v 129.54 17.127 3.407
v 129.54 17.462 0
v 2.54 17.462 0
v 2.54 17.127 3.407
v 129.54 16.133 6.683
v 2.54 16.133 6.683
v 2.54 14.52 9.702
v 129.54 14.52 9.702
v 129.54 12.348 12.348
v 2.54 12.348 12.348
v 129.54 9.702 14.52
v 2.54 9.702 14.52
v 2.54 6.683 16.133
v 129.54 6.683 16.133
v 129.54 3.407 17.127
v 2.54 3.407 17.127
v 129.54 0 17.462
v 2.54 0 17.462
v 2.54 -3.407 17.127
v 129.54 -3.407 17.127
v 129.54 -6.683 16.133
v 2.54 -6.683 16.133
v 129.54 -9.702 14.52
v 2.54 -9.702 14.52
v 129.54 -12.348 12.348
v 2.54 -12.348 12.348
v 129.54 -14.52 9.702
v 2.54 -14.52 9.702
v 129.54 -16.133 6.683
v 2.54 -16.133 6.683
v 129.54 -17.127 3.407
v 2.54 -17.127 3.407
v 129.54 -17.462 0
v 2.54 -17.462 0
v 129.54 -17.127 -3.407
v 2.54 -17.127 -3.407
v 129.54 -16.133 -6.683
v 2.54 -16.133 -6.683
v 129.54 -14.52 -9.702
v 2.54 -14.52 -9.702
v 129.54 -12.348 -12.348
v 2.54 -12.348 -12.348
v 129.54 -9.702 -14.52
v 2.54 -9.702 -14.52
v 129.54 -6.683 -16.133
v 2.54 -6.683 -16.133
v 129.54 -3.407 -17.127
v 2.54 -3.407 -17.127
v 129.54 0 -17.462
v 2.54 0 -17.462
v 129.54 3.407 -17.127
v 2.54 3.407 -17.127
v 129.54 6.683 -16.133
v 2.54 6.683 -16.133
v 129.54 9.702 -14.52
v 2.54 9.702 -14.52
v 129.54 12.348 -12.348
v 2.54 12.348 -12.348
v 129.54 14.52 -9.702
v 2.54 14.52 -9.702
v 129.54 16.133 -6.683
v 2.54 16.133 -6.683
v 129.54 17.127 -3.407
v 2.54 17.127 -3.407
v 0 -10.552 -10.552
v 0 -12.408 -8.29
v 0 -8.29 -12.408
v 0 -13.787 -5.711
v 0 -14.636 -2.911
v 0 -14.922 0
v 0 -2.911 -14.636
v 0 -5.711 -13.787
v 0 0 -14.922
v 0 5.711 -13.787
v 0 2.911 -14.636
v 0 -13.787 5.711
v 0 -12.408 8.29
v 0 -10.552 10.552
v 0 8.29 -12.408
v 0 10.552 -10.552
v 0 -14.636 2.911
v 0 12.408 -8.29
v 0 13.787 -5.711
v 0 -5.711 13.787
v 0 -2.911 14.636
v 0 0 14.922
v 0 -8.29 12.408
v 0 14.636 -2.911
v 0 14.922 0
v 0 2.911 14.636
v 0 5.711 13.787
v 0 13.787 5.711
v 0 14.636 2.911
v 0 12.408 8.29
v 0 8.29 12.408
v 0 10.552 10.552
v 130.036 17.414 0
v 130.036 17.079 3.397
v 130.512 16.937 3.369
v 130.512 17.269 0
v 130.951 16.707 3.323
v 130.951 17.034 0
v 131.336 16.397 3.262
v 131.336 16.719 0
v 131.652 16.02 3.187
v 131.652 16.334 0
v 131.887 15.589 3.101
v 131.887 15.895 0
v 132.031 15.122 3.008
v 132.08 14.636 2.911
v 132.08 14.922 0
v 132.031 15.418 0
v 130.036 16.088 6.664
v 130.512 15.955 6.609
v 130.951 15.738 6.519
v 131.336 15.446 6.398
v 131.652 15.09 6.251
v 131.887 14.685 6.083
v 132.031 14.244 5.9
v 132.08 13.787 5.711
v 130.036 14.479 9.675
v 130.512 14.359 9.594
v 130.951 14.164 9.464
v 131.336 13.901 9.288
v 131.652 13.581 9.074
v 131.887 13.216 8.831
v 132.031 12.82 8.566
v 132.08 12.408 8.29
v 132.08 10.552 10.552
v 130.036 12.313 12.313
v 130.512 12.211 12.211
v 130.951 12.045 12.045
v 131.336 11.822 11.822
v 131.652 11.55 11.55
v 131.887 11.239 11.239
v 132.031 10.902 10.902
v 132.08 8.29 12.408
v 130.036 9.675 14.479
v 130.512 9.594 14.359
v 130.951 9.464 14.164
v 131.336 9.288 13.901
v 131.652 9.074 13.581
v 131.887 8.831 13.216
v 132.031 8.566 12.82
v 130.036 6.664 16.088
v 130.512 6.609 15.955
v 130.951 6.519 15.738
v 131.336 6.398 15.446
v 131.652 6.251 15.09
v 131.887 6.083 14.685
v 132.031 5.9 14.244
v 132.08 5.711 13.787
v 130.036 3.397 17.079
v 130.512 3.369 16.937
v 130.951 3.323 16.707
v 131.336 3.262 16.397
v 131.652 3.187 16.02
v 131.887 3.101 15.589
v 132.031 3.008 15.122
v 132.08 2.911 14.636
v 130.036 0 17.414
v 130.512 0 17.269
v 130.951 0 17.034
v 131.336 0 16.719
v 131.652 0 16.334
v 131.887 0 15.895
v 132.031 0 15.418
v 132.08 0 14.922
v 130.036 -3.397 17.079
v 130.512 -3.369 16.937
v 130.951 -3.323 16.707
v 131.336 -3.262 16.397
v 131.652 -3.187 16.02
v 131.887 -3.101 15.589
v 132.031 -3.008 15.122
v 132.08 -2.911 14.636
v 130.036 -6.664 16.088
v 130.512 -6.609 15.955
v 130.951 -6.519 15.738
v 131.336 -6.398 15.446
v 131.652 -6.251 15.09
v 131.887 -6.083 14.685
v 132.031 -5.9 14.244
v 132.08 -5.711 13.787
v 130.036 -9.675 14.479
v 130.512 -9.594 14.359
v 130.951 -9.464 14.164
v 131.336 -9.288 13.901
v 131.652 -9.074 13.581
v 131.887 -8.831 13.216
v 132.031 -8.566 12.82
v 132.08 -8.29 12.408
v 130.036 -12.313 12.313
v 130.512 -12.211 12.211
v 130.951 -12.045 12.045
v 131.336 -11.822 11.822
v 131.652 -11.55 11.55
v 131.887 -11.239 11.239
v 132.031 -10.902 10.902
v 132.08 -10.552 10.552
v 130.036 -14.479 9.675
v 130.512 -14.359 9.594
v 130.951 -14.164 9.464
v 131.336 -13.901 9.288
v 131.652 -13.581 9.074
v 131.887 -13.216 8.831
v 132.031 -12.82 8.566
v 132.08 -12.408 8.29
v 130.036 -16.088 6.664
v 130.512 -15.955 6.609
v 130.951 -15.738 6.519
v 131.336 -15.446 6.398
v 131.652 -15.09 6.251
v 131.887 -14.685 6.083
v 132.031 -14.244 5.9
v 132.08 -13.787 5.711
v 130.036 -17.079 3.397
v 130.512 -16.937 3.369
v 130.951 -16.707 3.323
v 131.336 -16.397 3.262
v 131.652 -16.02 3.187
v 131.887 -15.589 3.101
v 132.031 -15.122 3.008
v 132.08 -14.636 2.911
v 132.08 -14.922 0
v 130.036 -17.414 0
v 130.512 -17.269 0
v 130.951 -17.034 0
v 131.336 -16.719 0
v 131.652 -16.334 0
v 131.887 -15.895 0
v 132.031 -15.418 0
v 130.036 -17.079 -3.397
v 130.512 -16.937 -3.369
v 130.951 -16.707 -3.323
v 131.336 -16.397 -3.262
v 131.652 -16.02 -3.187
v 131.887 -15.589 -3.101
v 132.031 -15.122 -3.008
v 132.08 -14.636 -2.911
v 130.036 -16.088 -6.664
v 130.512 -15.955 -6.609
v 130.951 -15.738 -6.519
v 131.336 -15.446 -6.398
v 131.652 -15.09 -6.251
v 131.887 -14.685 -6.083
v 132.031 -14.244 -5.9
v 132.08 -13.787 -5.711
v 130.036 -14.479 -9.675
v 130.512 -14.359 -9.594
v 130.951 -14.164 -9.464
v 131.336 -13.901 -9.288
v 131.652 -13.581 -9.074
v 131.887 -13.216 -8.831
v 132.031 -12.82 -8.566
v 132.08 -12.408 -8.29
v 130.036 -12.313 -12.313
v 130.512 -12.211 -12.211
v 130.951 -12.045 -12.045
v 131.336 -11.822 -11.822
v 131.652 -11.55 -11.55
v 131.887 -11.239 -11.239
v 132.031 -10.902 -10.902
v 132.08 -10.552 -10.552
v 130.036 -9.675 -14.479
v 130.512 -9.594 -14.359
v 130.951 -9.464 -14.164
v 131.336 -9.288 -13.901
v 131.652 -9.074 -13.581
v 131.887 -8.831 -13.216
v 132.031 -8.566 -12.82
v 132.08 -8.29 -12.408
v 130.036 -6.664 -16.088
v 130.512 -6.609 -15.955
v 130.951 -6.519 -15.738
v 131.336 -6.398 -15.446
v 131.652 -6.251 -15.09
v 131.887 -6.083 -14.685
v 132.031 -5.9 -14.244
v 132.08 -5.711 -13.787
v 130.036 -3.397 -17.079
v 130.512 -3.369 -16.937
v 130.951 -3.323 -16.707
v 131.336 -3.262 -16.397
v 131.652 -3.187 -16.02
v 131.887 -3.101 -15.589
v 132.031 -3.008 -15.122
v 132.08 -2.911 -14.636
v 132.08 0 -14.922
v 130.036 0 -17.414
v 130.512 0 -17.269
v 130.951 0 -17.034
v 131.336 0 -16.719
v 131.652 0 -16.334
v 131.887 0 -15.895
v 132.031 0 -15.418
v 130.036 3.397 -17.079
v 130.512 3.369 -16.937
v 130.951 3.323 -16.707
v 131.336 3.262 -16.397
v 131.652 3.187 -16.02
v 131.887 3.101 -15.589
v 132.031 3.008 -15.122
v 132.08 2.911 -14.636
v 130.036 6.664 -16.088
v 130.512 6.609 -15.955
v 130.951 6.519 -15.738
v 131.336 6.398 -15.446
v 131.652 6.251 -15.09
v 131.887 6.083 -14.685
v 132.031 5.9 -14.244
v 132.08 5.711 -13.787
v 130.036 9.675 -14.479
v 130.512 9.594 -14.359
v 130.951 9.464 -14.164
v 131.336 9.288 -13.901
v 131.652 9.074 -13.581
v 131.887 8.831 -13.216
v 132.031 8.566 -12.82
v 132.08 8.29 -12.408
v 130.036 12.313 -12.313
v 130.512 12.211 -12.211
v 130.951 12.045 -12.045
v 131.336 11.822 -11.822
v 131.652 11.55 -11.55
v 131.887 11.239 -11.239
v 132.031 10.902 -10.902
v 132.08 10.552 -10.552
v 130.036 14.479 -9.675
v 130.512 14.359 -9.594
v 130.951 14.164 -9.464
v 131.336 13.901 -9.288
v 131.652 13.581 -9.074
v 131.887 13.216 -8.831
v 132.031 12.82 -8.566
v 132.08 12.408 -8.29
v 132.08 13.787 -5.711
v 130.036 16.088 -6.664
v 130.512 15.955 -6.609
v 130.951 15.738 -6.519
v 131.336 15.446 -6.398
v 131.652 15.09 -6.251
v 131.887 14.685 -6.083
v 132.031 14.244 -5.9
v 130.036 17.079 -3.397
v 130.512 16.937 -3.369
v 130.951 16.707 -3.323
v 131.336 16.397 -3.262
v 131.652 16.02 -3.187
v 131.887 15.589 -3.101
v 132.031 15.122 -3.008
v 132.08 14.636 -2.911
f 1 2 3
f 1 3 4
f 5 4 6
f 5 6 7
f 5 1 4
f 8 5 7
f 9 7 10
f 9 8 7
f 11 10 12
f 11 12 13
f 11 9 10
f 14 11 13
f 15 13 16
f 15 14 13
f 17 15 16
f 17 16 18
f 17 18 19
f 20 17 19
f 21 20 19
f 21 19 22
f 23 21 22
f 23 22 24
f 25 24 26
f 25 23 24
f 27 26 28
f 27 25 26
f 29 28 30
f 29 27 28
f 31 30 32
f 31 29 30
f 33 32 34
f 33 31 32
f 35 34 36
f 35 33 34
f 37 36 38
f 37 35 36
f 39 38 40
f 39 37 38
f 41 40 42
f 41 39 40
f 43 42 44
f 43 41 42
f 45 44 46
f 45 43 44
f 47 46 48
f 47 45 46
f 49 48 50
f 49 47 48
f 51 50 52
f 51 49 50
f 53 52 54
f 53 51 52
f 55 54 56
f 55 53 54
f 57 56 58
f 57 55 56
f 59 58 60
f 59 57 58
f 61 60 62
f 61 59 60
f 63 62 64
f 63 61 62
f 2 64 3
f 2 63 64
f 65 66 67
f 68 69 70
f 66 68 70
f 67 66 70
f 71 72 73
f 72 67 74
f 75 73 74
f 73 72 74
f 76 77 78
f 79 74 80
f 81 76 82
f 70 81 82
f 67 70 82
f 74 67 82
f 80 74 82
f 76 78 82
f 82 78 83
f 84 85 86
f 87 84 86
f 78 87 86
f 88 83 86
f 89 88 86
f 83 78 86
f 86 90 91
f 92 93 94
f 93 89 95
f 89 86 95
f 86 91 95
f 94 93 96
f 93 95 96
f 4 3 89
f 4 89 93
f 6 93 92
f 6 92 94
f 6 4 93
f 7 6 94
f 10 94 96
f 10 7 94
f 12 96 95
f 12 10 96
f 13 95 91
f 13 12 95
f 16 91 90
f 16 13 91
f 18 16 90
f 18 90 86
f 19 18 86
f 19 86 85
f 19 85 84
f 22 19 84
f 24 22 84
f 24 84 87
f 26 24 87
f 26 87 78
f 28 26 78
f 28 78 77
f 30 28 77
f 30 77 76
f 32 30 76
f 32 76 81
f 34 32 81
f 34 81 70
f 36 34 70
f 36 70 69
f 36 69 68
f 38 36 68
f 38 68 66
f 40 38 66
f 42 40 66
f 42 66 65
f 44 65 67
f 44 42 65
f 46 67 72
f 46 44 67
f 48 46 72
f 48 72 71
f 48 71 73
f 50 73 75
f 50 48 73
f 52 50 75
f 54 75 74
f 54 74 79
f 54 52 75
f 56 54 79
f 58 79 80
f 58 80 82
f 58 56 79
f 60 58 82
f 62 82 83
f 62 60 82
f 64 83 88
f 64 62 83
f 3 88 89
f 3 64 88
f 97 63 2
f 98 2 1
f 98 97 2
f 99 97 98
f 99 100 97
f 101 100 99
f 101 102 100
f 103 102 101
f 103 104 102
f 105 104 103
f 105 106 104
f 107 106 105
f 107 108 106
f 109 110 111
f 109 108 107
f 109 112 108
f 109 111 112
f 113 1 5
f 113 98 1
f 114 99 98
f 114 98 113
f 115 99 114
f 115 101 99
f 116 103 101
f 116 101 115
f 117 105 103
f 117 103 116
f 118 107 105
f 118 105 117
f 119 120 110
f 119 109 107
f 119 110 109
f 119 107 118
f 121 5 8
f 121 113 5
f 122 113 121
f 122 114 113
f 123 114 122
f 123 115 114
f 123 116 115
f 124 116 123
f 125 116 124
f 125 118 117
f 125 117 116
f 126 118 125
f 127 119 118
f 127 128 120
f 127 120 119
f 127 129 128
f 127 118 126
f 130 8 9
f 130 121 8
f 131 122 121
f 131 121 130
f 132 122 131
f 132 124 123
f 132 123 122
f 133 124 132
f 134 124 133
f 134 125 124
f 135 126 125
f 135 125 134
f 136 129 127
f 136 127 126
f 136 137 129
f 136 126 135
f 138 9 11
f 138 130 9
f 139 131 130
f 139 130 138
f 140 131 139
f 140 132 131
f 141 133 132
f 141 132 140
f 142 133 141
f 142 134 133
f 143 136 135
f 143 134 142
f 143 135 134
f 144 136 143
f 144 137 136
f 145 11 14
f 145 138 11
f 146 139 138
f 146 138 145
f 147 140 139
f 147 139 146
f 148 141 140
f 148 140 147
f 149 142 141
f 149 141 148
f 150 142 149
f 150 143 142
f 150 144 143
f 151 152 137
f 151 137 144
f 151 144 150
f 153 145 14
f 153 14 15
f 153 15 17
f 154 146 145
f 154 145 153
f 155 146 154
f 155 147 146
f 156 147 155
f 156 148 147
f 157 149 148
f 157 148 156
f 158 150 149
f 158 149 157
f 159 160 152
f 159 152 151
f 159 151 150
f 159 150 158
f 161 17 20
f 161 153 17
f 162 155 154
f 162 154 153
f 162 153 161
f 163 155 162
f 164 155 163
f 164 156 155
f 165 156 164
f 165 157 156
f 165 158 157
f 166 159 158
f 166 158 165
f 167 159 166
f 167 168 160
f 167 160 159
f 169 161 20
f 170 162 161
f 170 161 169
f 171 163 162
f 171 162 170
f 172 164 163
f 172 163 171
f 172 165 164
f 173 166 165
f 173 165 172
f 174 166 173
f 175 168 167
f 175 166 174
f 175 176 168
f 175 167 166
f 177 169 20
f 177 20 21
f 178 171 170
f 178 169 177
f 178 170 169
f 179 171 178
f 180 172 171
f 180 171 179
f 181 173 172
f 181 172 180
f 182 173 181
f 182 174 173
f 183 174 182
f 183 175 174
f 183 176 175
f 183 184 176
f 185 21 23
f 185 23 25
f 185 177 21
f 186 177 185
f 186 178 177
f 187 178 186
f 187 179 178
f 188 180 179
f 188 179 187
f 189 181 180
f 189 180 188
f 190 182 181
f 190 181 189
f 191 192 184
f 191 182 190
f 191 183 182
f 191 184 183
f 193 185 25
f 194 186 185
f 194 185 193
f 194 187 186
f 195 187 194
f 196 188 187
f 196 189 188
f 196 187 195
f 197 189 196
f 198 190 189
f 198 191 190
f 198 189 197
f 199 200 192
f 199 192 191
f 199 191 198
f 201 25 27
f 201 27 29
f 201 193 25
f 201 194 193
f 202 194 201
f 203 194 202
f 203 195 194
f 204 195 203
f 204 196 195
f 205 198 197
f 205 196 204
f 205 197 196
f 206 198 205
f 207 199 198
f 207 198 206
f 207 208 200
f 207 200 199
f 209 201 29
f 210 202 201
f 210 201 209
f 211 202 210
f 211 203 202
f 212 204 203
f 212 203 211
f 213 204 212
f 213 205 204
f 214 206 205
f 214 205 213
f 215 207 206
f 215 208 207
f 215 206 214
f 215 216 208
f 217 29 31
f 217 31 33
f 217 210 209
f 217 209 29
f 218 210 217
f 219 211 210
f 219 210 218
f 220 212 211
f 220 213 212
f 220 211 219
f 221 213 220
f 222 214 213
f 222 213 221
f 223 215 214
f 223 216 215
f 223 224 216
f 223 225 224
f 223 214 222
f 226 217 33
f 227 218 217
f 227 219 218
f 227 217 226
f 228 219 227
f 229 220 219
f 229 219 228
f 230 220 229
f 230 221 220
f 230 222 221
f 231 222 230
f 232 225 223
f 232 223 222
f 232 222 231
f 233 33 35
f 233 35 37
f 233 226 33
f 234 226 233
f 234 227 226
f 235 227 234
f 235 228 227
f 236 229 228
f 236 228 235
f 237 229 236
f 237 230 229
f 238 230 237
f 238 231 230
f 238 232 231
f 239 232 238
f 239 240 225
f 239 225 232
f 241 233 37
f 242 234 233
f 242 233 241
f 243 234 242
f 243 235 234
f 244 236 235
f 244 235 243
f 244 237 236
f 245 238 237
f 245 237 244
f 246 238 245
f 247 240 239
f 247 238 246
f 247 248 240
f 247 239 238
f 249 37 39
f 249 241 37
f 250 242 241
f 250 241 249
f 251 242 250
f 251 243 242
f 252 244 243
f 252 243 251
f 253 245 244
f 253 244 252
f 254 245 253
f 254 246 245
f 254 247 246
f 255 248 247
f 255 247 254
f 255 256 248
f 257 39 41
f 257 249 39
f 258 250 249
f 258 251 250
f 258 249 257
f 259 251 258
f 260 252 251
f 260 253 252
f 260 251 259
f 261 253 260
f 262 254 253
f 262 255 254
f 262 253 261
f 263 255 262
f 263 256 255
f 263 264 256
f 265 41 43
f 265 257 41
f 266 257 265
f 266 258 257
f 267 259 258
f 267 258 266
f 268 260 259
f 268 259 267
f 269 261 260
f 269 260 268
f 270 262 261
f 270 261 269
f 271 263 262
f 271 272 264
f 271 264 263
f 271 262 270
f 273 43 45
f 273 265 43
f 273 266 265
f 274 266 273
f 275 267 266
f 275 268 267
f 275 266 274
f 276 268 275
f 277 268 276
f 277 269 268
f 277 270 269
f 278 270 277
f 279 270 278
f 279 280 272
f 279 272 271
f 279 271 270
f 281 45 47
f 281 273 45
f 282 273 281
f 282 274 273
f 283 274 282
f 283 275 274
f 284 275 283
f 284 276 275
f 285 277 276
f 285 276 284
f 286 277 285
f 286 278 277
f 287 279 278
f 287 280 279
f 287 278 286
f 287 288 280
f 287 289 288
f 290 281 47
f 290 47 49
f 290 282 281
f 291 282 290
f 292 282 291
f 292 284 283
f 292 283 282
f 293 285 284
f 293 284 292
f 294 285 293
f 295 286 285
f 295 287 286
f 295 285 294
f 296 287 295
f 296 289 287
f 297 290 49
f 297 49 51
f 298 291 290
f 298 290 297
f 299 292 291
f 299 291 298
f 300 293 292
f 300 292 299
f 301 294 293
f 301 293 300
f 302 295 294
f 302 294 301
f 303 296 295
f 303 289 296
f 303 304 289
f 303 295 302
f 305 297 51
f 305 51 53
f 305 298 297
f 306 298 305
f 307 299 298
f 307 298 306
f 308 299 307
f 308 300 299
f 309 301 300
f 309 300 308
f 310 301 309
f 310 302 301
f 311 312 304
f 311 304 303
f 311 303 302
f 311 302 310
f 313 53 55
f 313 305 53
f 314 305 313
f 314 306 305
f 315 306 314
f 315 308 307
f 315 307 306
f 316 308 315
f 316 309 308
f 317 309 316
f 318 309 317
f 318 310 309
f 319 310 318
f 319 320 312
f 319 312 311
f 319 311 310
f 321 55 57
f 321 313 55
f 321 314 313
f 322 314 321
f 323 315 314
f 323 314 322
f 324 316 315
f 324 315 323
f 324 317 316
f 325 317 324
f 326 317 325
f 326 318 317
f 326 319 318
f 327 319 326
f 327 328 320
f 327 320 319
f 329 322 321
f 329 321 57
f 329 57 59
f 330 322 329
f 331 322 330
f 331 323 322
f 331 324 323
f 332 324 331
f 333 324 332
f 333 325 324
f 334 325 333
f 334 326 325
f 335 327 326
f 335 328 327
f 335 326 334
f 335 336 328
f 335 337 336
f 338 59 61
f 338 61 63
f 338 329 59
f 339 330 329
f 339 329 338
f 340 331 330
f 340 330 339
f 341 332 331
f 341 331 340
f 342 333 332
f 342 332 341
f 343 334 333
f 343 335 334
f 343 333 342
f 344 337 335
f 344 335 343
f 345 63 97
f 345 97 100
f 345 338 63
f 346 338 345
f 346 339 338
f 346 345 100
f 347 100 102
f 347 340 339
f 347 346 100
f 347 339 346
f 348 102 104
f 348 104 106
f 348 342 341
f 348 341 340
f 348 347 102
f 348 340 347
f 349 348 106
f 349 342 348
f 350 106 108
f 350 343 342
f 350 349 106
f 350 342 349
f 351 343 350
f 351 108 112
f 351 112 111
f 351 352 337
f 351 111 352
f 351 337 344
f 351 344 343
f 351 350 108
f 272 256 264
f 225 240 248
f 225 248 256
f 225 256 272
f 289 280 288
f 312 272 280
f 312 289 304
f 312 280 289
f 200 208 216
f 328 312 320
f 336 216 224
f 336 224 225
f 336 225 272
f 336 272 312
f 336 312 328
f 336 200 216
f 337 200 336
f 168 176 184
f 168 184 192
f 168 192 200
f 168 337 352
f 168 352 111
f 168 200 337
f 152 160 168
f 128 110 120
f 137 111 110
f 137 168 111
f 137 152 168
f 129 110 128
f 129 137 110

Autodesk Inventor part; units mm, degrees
ref_plane "Start Plane" through (0, 0, 0) normal (1, 0, 0) x (0, 1, 0)
ref_plane "XZ Plane" through (0, 0, 0) normal (0, 1, 0) x (-1, 0, 0)
ref_plane "XY Plane" through (0, 0, 0) normal (0, 0, 1) x (1, 0, 0)
sketch "Main Sketch" plane through (0, 0, 0) normal (0, 0, 1) x (1, 0, 0)
  line L0 (0, 0) -> (132.08, 0)
  line L1 (0, 0) -> (0, 17.4625)
  line L2 (132.08, 17.4625) -> (132.08, 0)
  line L3 (0, 17.4625) -> (132.08, 17.4625)
  dimension "d3" = 34.925
revolve "Revolution1" add sketch "Main Sketch" angle 360 about axis through (0, 0, 0) along (1, 0, 0)
chamfer "Chamfer1" distance 2.54 angle 45 1 edges at (0, -17.4625, 0) measured on face at (88.0533, 17.4059, -1.4051)
fillet "Fillet1" radius 2.54 1 edges at (132.08, -17.4625, 0)
properties part number "Shaft" material "Steel"
